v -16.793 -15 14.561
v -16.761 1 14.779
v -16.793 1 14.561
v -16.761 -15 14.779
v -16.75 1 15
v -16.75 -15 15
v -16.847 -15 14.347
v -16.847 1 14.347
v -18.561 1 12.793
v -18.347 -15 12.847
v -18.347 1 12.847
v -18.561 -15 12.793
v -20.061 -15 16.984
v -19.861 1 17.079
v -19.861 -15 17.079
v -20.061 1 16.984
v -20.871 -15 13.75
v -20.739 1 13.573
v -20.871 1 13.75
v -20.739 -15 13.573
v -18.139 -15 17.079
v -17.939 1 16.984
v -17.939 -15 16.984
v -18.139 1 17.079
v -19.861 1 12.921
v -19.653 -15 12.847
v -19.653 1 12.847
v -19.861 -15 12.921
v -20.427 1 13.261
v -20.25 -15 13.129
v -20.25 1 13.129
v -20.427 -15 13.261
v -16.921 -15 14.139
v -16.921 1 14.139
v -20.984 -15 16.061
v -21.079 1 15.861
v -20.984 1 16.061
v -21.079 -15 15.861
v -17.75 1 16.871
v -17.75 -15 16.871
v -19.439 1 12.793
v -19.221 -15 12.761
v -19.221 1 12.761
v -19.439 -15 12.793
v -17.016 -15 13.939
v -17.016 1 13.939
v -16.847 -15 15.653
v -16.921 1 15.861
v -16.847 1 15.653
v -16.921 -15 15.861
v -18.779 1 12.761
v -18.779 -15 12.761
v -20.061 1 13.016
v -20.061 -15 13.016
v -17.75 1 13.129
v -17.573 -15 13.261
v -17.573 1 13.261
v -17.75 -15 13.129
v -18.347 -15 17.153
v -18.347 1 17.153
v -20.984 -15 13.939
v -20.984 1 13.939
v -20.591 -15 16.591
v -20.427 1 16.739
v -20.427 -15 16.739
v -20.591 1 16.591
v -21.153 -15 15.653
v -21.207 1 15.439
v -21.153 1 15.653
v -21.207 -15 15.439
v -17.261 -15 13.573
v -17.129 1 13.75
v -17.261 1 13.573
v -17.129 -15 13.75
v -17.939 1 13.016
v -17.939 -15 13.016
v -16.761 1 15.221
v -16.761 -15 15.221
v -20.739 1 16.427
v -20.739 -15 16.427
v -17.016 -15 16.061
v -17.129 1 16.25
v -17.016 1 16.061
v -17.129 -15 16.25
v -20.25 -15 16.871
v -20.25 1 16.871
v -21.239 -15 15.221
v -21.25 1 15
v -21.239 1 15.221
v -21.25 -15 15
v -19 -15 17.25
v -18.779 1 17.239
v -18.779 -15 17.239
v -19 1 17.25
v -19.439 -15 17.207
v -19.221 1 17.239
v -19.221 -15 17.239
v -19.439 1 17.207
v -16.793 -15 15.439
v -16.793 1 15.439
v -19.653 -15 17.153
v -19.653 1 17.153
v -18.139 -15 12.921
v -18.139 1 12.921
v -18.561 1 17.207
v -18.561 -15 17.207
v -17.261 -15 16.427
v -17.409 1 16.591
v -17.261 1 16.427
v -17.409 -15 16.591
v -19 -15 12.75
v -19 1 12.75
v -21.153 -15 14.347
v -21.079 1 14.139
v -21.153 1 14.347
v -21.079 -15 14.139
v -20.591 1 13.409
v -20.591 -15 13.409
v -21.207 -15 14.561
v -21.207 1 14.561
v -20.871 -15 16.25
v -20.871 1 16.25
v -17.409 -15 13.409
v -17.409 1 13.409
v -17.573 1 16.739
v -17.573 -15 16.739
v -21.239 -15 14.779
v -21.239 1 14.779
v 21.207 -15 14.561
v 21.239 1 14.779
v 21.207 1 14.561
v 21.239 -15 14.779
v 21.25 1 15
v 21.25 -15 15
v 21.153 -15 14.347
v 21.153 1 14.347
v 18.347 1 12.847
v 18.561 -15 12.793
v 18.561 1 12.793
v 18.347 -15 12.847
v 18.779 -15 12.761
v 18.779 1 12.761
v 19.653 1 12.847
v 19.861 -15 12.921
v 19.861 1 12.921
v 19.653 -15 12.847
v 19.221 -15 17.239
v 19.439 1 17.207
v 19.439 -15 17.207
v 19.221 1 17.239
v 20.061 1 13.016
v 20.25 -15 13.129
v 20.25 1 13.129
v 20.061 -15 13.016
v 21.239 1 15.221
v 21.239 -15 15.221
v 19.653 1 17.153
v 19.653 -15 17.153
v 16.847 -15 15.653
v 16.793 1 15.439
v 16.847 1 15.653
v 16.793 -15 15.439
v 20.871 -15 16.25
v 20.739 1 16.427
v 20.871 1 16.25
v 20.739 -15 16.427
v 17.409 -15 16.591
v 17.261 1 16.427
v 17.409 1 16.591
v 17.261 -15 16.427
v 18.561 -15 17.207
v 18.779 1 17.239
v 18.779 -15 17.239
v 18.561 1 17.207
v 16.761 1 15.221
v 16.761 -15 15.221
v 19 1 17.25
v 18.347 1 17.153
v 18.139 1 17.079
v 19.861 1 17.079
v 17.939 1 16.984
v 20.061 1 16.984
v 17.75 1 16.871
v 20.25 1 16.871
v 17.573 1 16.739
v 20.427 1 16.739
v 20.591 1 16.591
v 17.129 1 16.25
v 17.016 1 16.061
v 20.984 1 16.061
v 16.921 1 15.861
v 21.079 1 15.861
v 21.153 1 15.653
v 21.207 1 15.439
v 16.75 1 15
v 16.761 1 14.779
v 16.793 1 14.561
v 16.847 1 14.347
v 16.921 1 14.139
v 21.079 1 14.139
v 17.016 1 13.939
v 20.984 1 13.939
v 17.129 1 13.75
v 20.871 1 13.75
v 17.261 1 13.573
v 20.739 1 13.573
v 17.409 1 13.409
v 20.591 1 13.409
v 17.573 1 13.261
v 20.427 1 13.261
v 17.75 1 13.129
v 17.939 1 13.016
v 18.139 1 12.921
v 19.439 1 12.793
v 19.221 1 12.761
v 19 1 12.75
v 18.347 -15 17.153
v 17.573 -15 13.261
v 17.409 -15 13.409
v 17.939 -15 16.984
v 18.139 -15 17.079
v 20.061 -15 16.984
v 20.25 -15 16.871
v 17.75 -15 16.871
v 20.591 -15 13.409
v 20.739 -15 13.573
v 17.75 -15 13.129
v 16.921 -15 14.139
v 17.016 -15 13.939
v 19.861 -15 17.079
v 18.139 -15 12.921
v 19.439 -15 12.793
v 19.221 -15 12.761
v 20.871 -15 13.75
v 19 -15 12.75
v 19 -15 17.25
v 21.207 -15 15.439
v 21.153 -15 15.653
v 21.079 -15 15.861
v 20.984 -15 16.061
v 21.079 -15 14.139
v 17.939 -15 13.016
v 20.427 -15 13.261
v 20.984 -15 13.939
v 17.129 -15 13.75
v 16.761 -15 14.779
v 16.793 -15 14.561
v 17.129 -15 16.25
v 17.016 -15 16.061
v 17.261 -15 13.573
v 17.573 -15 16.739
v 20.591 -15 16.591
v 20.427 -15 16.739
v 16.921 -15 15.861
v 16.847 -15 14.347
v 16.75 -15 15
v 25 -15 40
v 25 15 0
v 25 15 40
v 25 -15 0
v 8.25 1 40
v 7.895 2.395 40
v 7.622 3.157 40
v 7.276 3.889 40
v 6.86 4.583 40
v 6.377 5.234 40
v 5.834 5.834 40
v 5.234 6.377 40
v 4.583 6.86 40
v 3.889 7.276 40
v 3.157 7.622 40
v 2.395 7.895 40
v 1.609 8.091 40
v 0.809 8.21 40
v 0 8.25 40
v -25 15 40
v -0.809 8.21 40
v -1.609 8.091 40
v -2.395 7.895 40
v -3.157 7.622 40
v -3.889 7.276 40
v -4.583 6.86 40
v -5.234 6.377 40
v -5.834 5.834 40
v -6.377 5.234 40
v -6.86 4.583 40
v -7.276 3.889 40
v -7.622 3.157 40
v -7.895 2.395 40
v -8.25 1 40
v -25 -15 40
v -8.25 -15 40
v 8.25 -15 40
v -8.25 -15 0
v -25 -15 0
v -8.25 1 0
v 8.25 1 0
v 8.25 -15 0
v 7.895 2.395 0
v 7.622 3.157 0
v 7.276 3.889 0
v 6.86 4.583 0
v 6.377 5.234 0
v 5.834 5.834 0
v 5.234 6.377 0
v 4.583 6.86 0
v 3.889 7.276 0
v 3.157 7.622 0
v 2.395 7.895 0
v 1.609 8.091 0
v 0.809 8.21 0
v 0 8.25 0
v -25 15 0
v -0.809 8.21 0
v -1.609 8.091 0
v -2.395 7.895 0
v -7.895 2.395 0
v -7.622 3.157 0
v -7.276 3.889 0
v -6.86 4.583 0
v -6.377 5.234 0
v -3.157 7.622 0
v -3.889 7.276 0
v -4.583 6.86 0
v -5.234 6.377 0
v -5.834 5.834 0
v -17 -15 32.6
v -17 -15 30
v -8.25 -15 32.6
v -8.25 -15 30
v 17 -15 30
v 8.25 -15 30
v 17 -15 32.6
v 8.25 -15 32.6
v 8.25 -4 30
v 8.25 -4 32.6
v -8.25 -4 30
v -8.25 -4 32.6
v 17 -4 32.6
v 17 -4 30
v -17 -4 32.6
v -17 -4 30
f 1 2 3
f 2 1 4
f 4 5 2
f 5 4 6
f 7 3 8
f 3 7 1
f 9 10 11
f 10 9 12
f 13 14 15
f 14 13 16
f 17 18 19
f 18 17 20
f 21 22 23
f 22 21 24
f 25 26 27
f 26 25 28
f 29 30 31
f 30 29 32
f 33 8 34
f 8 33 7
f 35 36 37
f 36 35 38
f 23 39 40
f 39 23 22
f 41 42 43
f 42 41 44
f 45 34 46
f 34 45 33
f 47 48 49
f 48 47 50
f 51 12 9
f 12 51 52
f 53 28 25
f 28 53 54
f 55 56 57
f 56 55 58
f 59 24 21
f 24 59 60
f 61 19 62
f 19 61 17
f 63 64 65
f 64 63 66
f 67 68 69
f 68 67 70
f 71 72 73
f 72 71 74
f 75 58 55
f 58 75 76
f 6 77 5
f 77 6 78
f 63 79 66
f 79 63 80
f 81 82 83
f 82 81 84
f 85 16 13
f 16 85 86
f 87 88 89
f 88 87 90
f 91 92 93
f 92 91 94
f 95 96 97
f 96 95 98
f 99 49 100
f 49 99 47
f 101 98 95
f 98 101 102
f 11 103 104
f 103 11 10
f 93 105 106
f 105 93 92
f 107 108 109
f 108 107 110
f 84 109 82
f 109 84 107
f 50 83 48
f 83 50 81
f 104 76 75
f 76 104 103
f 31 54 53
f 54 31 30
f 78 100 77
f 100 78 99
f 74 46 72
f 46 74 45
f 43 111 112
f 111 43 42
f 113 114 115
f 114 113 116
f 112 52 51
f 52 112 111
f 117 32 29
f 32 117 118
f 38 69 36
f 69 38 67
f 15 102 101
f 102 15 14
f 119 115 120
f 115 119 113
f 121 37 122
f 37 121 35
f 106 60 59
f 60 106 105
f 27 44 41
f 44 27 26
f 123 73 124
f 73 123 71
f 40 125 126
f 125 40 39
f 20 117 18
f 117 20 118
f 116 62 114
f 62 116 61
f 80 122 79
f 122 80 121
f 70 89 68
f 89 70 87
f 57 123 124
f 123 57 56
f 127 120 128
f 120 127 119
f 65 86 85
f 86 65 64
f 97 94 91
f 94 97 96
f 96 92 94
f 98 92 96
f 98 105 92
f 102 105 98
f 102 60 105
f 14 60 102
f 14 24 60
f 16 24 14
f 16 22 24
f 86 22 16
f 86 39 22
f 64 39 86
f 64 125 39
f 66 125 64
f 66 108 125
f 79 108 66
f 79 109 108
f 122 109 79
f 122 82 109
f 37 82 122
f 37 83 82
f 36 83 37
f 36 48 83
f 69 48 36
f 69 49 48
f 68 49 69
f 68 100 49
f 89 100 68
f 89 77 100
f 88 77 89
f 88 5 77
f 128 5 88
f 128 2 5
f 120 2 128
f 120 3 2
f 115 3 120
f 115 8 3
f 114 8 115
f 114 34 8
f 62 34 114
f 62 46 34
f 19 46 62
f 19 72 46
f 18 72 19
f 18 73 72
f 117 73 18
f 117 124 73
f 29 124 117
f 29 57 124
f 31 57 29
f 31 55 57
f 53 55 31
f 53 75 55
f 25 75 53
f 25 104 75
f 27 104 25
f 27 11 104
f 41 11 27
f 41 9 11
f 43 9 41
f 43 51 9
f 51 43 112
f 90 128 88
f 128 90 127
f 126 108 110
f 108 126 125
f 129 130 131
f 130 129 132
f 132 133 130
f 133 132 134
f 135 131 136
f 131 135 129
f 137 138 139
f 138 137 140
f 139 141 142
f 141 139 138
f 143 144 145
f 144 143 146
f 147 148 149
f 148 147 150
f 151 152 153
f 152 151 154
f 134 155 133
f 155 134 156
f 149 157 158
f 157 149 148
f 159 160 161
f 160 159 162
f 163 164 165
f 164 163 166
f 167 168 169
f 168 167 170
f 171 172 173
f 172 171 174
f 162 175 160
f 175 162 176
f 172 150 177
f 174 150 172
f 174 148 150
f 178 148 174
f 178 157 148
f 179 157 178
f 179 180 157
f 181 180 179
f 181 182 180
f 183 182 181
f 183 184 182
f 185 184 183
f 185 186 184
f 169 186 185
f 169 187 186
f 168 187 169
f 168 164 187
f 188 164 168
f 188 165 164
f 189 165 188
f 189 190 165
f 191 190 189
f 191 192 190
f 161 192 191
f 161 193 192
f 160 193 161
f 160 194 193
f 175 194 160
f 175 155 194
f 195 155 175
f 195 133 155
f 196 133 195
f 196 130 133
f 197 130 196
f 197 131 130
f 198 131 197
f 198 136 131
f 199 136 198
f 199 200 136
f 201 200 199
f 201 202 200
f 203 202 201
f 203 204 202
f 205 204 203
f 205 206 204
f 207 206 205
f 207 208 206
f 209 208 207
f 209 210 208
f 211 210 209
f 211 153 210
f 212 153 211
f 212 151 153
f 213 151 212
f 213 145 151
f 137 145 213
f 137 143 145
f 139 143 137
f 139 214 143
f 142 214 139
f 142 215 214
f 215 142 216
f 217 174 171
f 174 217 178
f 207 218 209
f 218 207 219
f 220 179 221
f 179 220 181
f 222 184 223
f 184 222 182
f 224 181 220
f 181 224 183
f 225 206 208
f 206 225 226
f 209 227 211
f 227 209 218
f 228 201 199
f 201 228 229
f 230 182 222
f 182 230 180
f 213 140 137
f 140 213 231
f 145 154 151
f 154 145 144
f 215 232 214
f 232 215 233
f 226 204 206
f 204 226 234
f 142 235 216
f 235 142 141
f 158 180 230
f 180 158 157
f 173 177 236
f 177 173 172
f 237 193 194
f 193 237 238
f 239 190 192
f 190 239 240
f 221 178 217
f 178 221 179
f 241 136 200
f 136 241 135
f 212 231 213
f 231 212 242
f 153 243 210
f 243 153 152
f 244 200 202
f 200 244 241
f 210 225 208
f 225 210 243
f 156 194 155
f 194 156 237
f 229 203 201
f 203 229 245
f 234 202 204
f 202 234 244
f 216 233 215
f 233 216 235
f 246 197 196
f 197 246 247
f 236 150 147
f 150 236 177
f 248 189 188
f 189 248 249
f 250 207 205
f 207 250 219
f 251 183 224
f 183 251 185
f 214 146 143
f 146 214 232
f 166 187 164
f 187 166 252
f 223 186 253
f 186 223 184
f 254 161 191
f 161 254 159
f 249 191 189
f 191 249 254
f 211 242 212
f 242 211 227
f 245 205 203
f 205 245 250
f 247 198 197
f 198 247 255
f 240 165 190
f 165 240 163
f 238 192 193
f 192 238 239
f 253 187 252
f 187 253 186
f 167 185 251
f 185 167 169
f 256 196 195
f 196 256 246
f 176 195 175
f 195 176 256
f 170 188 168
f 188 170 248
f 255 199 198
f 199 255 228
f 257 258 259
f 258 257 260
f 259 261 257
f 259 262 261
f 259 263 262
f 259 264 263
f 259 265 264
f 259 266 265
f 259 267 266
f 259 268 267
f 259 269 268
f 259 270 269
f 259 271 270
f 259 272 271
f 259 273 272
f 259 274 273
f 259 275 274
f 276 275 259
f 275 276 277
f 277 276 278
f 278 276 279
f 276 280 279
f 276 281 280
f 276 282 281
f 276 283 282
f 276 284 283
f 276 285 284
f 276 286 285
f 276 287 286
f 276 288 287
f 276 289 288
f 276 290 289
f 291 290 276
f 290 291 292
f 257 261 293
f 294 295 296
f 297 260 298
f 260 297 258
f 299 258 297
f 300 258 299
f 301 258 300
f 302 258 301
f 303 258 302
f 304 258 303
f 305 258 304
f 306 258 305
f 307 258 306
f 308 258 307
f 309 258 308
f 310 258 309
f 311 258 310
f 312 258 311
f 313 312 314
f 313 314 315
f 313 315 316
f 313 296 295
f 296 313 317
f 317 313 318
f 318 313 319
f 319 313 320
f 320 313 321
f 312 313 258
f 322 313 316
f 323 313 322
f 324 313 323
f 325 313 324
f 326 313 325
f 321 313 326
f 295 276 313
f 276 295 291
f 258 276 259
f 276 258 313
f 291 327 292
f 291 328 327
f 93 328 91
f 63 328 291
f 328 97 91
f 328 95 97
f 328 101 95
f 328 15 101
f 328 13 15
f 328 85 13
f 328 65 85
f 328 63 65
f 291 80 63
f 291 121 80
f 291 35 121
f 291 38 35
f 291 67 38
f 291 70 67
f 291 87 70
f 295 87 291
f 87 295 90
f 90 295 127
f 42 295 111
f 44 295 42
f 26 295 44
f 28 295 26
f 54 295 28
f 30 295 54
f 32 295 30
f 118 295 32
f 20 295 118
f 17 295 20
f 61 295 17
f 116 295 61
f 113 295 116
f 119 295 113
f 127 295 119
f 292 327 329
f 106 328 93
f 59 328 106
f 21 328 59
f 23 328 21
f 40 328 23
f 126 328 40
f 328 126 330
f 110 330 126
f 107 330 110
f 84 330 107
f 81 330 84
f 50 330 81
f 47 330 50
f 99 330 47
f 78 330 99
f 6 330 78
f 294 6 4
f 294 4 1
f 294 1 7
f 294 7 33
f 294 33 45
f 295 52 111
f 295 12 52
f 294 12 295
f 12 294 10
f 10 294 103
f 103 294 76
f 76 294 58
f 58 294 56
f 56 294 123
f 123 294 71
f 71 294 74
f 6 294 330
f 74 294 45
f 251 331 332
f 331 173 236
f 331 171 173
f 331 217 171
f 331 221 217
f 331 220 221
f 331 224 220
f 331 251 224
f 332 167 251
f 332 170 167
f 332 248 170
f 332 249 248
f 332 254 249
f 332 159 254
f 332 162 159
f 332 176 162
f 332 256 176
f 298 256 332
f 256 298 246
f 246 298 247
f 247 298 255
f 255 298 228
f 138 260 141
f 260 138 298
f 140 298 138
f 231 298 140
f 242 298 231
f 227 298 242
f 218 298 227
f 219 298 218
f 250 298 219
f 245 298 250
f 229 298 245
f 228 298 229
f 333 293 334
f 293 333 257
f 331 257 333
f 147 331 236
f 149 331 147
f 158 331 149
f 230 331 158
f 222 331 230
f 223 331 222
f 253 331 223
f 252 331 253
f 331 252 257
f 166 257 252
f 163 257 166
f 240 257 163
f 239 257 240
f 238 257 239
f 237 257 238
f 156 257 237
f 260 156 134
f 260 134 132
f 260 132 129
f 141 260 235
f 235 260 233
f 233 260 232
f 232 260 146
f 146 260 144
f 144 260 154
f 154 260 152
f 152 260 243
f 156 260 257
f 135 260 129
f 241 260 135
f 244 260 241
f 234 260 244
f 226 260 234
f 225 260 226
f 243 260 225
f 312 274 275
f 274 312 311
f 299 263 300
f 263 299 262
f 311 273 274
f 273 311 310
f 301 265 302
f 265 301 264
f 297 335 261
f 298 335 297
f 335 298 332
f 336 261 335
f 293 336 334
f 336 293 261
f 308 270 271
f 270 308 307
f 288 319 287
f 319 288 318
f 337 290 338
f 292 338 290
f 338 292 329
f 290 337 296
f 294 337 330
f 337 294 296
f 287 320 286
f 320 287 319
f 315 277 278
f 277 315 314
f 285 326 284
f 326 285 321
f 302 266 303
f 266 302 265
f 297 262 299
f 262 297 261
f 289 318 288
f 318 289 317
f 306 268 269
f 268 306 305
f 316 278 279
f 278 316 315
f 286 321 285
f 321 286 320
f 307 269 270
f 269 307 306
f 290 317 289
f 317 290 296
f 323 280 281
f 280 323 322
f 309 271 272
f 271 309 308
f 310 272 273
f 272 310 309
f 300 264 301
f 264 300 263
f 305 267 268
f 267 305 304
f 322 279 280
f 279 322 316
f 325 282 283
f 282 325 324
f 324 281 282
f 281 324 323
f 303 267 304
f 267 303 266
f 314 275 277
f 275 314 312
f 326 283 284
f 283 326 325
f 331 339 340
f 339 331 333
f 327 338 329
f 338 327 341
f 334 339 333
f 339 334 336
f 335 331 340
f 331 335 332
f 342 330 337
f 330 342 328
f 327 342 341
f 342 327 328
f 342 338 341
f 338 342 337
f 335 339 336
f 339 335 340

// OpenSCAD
// Wall-mounted syringe holder for 10mL syringe
// Designed for FDM printing, standing on the XY plane.

// --- Dimensions ---
block_w = 50.0;       // Width (X)
block_d = 30.0;       // Depth (Y)
block_h = 40.0;       // Height (Z)

barrel_dia = 16.5;    // Diameter of the syringe barrel channel
barrel_rad = barrel_dia / 2;

flange_w = 34.0;      // Width of the flange slot (X)
flange_h = 2.6;       // Height of the flange slot (Z)
flange_z_start = 30.0; // Bottom of the flange slot
flange_y_end = 11.0;  // How far back the slot goes (Y)

screw_hole_d = 4.5;   // Diameter for M4 screws
screw_hole_x = 19.0;  // Offset from center for screw holes (X)
screw_hole_z = 15.0;  // Height of screw holes (Z)

$fn = 64;

// --- Modeling ---

// The main block
difference() {
    // Base block centered on XY, sitting on Z=0
    translate([-block_w/2, -block_d/2, 0])
        cube([block_w, block_d, block_h]);

    // 1. Syringe Barrel Channel
    // The back is a half-circle at y=0, sides run to the front face (y=-15)
    // We use a hull of two half-circles/rectangles to create the channel
    hull() {
        // Back half-circle at y = 0
        translate([0, 0, -1])
            cylinder(h = block_h + 2, d = barrel_dia);
        
        // Front rectangle/extension to ensure it cuts through the front face
        translate([-barrel_rad, -block_d, -1])
            cube([barrel_dia, block_d + 1, block_h + 2]);
    }

    // 2. Flange Slot
    // Cut from the front face (y = -15) back to y = 11
    translate([-flange_w/2, -block_d - 1, flange_z_start])
        cube([flange_w, (block_d/2 + 11) + 1, flange_h]);

    // 3. Screw Holes
    // Two M4 holes through the block along the Y axis
    for (sx = [-screw_hole_x, screw_hole_x]) {
        translate([sx, -block_d - 1, screw_hole_z])
            rotate([-90, 0, 0])
                cylinder(h = block_d + 2, d = screw_hole_d);
    }
}
